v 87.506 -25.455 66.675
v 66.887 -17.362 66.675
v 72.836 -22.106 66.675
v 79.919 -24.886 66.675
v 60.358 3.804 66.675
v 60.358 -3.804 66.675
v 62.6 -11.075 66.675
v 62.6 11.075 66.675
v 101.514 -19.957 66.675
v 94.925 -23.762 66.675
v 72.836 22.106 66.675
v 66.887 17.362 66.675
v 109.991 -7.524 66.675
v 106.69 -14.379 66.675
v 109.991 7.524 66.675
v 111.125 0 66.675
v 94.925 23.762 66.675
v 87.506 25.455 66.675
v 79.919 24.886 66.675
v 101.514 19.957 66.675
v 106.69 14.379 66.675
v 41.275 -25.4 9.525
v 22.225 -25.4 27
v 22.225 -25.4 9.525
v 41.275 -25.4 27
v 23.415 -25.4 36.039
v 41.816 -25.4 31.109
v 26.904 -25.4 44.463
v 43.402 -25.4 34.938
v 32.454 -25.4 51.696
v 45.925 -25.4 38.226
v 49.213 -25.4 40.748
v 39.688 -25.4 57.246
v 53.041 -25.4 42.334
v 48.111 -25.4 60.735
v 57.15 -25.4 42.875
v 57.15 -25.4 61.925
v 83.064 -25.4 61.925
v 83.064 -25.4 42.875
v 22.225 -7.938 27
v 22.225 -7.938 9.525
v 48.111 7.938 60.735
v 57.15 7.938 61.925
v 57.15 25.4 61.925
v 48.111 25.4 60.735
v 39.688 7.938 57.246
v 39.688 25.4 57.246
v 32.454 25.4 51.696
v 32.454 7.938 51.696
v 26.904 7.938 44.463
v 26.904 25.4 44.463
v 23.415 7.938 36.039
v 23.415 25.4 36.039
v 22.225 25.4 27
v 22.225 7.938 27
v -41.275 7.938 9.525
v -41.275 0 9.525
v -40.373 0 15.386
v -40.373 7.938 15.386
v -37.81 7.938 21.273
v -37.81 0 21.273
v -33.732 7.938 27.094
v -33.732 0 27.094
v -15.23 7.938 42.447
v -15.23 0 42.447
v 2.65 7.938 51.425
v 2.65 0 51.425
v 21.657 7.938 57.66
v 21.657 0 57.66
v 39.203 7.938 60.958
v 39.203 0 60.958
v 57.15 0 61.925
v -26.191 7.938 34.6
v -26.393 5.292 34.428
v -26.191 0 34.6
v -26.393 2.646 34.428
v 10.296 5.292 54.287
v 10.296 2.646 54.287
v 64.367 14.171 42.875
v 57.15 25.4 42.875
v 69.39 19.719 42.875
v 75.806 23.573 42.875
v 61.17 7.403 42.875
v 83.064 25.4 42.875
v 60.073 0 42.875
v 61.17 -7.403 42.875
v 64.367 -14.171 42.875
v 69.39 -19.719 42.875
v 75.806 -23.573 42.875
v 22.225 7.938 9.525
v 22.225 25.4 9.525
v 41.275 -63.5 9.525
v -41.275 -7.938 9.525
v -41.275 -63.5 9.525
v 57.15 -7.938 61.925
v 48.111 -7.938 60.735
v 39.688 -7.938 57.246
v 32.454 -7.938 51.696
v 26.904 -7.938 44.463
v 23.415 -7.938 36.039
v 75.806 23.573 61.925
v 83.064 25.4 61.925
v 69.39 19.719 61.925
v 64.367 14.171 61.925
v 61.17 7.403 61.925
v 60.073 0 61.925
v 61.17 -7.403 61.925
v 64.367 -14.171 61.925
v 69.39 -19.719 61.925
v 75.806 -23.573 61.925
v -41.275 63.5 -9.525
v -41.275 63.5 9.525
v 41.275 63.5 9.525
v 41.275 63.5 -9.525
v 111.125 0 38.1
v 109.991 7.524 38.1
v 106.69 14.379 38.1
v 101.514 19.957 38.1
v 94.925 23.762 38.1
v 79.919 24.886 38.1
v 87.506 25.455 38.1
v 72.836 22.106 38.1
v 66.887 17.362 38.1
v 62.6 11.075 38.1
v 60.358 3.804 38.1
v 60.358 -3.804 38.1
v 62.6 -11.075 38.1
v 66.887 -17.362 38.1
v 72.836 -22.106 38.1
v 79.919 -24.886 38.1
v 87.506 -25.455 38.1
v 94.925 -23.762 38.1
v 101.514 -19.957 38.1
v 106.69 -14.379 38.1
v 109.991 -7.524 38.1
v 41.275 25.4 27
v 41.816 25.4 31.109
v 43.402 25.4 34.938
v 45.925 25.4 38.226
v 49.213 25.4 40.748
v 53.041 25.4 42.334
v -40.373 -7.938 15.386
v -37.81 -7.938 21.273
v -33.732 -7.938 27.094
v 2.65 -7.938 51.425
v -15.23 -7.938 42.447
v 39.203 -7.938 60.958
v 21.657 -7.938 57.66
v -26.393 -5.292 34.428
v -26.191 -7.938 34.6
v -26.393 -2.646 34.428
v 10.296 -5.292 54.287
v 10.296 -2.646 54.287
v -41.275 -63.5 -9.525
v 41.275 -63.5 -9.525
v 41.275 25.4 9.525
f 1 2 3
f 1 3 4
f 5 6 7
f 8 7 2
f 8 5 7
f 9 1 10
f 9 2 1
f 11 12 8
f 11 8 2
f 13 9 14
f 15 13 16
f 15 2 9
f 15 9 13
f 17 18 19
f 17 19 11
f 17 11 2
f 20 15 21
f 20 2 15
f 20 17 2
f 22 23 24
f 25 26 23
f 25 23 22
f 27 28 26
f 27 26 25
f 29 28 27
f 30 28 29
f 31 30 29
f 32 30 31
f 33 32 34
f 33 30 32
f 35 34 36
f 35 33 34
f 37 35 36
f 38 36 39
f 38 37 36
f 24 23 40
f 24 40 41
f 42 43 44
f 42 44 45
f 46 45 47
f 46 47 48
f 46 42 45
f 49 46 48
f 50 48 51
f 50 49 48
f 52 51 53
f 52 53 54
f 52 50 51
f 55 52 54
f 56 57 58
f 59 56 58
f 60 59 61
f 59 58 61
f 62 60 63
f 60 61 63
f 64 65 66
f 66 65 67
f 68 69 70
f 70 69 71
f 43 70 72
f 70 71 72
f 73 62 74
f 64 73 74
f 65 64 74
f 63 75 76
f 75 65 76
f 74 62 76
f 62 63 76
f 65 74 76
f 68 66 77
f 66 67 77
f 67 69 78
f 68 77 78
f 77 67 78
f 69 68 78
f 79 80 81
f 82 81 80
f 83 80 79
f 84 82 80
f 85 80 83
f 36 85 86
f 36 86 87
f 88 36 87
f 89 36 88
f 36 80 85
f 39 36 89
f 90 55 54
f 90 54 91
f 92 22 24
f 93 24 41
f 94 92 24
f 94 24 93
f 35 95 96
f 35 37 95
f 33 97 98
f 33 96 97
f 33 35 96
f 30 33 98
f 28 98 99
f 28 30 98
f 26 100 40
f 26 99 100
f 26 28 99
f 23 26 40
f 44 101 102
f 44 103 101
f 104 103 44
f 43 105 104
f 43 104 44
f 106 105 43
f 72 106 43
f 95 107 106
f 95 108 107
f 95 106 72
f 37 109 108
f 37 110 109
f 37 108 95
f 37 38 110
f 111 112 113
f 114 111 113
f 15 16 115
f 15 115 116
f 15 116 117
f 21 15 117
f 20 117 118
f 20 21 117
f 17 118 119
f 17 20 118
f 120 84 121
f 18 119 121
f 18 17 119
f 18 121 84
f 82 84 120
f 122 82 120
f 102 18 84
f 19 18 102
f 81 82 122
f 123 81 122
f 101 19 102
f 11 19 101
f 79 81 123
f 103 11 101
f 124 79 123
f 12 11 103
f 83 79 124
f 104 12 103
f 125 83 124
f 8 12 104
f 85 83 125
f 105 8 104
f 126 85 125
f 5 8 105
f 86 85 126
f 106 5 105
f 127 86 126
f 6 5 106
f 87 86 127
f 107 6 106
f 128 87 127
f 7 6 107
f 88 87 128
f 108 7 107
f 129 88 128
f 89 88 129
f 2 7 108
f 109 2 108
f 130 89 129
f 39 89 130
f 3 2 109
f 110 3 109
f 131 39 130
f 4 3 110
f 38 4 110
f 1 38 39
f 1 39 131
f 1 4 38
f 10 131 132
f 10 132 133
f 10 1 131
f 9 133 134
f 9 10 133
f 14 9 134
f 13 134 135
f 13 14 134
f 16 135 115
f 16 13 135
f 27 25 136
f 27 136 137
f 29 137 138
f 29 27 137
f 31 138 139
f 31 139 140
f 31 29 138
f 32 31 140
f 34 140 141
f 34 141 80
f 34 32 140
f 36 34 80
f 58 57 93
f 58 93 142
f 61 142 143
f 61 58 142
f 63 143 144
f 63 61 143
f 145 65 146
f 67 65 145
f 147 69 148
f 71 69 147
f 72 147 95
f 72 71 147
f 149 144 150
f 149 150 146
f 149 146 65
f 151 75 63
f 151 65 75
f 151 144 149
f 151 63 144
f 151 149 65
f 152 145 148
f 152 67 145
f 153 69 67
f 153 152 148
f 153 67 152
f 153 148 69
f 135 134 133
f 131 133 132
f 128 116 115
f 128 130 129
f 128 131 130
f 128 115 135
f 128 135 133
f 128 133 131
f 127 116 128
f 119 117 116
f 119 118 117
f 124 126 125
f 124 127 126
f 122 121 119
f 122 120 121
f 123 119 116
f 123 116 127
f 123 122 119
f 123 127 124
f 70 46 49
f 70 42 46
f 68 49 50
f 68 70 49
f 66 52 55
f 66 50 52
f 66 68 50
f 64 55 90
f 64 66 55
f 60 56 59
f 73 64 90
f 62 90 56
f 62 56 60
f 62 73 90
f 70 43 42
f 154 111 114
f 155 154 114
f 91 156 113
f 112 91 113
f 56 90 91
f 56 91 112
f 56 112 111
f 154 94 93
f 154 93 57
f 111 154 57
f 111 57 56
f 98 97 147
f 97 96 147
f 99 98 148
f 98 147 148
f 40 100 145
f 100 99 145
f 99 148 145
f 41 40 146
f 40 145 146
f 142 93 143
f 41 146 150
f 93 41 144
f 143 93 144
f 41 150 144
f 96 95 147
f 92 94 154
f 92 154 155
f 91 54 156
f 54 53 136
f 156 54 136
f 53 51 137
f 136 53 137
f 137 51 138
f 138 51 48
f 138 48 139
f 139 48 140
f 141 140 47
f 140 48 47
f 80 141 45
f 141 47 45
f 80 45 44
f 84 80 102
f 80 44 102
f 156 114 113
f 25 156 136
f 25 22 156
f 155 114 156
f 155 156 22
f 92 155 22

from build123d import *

# Parameters (mm, degrees)
F1_DEPTH = 63.5
F0_W     = 25.2737943477
F0_H     = 19.05
F2_DEPTH = 25.4
F3_DEPTH = 7.9375


with BuildPart() as f1:
    # F0 (on Front) → F1 (new body, symmetric)
    with BuildSketch(Plane.XZ):
        Polygon((-41.275, 9.525), (-41.275, -9.525), (41.275, -9.525), (41.275, 9.525), (22.225, 9.525), align=None)
    extrude(amount=F1_DEPTH, both=True)

    # F0 (on Front) → F2 (join, symmetric)
    with BuildSketch(Plane.XZ):
        with BuildLine():
            Line((22.225, 9.525), (41.275, 9.525))
            Line((41.275, 9.525), (41.275, 27.0002))
            ThreePointArc((41.275, 27.0002), (45.9246798487, 38.2255201513), (57.15, 42.8752))
            Line((57.15, 42.8752), (60.325, 42.8752))
            Line((60.325, 42.8752), (60.325, 61.9252))
            Line((60.325, 61.9252), (57.15, 61.9252))
            ThreePointArc((57.15, 61.9252), (32.4542956671, 51.6959043329), (22.225, 27.0002))
            Line((22.225, 27.0002), (22.225, 9.525))
        make_face()
        with Locations((72.9618971738, 52.4002)):
            Rectangle(F0_W, F0_H)
    extrude(amount=F2_DEPTH, both=True)

    # F0 (on Front) → F3 (join, symmetric)
    with BuildSketch(Plane.XZ):
        with BuildLine():
            add(Edge.make_bspline(
                [(-41.275, 9.525), (-41.1781184375, 34.5562882721), (9.094000794, 62.791056931), (57.15, 61.9252)],
                knots=[0, 0, 0, 0, 111.5045361635, 111.5045361635, 111.5045361635, 111.5045361635], degree=3))
            Line((-41.275, 9.525), (22.225, 9.525))
            Line((22.225, 9.525), (22.225, 27.0002))
            ThreePointArc((22.225, 27.0002), (32.4542956671, 51.6959043329), (57.15, 61.9252))
        make_face()
    extrude(amount=F3_DEPTH, both=True)

    # F0 (on Front) → F4 (revolve)
    with BuildSketch(Plane.XZ):
        Polygon((85.5987943477, 66.675), (85.5987943477, 61.9252), (85.5987943477, 42.8752), (85.5987943477, 38.1), (111.125, 38.1), (111.125, 66.675), align=None)
    revolve(axis=Axis((85.5987943477, 0, 52.3875), (0, 0, 1)))


solid = f1.part
